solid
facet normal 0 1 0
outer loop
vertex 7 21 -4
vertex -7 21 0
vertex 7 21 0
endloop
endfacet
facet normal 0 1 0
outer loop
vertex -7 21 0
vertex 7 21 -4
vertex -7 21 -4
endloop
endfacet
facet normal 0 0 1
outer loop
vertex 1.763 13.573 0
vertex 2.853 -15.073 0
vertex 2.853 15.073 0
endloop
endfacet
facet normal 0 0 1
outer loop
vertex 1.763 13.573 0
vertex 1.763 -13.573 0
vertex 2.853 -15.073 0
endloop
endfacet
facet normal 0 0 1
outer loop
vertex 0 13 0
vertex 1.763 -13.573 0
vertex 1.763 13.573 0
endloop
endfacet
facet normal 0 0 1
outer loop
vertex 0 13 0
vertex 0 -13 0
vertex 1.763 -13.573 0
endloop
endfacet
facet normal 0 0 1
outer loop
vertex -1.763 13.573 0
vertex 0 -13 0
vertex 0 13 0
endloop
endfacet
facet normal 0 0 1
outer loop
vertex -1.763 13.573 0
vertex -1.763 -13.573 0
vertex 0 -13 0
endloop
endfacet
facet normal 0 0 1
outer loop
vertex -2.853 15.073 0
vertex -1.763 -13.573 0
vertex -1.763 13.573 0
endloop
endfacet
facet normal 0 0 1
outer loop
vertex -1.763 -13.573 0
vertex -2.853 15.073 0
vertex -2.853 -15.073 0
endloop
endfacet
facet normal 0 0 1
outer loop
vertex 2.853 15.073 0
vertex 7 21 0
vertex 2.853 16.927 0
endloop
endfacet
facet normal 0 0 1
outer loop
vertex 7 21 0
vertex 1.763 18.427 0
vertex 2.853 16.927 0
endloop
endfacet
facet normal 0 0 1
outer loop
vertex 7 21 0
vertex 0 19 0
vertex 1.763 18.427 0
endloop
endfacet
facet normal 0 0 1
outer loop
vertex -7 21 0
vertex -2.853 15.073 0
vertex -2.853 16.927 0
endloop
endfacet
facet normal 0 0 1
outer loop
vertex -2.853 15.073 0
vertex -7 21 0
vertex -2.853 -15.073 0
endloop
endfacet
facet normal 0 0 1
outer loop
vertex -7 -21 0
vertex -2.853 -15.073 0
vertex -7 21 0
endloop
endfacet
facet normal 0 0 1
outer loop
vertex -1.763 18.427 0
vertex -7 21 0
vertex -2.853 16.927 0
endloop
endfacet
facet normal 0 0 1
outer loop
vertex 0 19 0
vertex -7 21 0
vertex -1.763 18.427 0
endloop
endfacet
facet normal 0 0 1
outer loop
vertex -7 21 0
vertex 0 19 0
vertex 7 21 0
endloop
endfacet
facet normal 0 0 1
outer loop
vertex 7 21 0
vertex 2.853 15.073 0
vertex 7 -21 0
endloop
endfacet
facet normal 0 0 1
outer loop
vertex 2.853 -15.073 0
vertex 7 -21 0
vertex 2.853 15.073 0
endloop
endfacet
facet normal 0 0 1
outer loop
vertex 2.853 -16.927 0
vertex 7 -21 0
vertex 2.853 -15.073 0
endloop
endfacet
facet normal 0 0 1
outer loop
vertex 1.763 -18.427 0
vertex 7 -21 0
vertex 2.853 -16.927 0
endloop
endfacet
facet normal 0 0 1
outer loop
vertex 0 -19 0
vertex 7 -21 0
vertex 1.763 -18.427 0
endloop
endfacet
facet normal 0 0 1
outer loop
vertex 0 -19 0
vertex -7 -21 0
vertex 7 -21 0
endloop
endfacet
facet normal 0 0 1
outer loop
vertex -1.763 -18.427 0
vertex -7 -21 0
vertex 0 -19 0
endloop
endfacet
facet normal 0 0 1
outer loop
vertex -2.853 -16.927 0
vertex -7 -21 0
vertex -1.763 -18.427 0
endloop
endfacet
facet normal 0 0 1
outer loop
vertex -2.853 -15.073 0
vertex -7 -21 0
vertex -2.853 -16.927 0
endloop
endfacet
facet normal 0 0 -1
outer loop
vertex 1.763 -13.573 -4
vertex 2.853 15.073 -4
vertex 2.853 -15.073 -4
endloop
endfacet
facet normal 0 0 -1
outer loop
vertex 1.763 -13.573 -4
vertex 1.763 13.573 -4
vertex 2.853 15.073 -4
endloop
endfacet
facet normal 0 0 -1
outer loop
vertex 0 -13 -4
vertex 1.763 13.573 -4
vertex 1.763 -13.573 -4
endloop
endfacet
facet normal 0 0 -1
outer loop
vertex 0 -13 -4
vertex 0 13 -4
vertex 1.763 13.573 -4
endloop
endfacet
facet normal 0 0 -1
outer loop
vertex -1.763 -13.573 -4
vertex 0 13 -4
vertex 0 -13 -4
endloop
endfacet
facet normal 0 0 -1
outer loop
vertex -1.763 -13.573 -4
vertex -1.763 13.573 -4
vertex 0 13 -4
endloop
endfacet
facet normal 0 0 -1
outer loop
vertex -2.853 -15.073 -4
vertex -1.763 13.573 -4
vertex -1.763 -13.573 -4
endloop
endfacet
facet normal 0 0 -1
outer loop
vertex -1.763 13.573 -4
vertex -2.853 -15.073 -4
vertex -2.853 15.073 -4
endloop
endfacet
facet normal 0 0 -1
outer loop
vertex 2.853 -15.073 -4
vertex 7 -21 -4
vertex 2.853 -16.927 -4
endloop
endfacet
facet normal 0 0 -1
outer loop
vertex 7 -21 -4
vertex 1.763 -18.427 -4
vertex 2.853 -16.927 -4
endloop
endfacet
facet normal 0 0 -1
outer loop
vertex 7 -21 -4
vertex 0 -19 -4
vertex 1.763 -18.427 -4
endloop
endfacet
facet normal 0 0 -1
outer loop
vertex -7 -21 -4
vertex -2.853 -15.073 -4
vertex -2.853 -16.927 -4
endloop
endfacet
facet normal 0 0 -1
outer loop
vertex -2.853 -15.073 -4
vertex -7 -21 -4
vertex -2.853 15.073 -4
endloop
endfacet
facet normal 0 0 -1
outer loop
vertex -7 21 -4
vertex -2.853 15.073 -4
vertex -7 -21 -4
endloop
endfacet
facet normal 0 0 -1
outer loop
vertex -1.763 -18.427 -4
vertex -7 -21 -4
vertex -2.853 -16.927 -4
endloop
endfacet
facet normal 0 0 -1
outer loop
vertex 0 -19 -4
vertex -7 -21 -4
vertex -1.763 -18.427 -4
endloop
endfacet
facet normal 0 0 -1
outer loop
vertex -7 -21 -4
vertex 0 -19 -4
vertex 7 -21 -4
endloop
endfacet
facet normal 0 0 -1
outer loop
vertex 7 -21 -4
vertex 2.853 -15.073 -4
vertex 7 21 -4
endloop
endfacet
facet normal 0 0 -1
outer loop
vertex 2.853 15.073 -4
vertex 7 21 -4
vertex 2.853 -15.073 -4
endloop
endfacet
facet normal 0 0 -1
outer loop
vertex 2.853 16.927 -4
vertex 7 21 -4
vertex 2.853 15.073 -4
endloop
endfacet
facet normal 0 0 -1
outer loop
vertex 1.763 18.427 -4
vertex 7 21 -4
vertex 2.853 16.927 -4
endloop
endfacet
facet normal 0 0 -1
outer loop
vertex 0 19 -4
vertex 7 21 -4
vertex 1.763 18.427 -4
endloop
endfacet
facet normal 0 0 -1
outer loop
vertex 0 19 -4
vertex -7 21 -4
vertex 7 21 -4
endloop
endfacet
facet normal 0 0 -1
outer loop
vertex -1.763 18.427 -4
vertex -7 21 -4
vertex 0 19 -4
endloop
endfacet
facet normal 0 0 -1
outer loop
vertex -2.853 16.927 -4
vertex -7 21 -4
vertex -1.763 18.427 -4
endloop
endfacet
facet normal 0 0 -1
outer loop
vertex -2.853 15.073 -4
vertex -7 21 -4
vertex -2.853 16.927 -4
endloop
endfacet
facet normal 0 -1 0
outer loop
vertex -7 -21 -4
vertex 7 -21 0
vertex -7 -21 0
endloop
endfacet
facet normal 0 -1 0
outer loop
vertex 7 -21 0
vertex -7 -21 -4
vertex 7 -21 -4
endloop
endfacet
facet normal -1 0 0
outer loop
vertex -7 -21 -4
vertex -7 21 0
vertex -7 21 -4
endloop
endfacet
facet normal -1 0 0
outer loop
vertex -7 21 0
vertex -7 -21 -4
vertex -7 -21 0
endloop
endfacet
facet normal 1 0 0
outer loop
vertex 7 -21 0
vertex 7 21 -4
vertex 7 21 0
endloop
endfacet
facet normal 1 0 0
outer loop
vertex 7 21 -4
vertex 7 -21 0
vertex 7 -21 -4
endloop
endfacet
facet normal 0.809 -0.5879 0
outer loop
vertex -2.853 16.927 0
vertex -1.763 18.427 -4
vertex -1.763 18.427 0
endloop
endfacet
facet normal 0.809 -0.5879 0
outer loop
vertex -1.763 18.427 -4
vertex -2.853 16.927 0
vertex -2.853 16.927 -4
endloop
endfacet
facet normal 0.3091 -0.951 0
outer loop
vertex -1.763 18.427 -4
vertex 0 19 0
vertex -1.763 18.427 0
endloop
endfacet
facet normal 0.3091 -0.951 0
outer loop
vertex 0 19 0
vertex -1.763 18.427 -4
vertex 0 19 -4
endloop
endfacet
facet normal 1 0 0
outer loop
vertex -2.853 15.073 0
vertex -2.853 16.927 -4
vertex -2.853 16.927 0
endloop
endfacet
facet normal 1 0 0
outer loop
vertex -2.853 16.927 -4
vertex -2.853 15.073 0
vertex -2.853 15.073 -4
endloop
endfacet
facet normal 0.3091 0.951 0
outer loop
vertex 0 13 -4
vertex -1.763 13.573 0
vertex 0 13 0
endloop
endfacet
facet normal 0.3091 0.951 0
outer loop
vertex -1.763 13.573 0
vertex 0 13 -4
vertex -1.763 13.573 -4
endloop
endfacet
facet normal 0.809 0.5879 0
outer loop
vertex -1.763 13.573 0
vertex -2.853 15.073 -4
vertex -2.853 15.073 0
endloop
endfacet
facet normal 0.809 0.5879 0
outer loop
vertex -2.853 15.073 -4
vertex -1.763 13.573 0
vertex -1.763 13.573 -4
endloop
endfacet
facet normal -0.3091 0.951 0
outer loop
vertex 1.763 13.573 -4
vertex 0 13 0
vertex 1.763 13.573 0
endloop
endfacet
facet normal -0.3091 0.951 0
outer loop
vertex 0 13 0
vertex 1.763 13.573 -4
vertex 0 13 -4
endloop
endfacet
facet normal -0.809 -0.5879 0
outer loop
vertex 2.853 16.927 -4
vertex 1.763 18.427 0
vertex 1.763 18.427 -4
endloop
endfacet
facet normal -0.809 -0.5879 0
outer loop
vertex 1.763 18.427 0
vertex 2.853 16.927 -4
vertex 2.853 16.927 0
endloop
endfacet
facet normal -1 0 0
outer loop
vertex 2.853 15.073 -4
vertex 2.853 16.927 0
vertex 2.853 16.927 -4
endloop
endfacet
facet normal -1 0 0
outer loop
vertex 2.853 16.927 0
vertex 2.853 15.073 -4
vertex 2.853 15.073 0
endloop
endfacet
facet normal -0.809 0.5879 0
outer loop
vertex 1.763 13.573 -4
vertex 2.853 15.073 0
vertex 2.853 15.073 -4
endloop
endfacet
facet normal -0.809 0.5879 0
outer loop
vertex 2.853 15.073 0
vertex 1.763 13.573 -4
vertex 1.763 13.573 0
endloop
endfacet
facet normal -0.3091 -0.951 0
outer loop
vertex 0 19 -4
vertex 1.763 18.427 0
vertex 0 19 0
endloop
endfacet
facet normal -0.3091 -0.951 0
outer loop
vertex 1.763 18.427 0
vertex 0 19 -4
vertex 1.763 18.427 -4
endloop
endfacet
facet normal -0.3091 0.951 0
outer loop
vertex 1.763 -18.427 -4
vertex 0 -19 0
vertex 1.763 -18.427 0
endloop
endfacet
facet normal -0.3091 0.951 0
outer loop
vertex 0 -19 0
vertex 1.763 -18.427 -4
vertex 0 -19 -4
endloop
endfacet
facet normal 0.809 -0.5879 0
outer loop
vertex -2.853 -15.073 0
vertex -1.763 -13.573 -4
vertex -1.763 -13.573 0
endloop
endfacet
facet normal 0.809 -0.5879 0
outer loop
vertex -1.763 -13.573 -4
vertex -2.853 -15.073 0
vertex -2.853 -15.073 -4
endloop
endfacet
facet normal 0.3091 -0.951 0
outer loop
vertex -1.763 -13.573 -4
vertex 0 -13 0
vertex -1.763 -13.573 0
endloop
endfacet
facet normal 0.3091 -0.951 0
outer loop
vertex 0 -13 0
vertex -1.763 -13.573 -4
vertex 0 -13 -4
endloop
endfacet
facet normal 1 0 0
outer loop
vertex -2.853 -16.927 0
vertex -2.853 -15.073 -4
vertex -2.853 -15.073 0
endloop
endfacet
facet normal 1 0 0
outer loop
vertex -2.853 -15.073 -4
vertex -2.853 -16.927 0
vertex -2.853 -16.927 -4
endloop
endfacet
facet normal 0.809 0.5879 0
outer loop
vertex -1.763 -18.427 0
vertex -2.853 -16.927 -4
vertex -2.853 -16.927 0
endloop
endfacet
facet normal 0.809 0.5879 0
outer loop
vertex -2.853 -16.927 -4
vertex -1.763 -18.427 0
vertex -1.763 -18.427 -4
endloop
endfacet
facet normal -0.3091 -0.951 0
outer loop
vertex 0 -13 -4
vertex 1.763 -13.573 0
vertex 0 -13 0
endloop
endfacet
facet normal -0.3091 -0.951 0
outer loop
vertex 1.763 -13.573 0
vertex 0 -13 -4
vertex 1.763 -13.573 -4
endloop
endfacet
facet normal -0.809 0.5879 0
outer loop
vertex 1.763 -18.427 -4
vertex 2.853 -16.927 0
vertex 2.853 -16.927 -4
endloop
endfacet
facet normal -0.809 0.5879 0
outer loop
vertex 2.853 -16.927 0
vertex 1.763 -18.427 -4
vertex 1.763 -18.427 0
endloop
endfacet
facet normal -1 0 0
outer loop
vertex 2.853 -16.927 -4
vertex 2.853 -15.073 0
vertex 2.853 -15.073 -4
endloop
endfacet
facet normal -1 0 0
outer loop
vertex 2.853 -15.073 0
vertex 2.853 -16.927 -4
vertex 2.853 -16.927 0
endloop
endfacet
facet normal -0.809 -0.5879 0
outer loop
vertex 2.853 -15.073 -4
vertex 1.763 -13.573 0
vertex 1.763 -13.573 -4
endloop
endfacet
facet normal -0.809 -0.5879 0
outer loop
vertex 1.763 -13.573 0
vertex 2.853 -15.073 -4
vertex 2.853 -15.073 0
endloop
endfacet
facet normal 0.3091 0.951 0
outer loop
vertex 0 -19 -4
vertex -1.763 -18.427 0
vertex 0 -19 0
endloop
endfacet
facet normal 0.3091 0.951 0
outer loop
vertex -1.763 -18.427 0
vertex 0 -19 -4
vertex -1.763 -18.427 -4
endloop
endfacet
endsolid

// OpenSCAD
rotate ([0,0,90]) translate ([0,0,-2]) difference (){
    cube([42,14,4], center = true);
    translate ([+16,0,0]) cylinder(d=6,h=100,center=true);
    translate ([-16,0,0]) cylinder(d=6,h=100,center=true);
}
